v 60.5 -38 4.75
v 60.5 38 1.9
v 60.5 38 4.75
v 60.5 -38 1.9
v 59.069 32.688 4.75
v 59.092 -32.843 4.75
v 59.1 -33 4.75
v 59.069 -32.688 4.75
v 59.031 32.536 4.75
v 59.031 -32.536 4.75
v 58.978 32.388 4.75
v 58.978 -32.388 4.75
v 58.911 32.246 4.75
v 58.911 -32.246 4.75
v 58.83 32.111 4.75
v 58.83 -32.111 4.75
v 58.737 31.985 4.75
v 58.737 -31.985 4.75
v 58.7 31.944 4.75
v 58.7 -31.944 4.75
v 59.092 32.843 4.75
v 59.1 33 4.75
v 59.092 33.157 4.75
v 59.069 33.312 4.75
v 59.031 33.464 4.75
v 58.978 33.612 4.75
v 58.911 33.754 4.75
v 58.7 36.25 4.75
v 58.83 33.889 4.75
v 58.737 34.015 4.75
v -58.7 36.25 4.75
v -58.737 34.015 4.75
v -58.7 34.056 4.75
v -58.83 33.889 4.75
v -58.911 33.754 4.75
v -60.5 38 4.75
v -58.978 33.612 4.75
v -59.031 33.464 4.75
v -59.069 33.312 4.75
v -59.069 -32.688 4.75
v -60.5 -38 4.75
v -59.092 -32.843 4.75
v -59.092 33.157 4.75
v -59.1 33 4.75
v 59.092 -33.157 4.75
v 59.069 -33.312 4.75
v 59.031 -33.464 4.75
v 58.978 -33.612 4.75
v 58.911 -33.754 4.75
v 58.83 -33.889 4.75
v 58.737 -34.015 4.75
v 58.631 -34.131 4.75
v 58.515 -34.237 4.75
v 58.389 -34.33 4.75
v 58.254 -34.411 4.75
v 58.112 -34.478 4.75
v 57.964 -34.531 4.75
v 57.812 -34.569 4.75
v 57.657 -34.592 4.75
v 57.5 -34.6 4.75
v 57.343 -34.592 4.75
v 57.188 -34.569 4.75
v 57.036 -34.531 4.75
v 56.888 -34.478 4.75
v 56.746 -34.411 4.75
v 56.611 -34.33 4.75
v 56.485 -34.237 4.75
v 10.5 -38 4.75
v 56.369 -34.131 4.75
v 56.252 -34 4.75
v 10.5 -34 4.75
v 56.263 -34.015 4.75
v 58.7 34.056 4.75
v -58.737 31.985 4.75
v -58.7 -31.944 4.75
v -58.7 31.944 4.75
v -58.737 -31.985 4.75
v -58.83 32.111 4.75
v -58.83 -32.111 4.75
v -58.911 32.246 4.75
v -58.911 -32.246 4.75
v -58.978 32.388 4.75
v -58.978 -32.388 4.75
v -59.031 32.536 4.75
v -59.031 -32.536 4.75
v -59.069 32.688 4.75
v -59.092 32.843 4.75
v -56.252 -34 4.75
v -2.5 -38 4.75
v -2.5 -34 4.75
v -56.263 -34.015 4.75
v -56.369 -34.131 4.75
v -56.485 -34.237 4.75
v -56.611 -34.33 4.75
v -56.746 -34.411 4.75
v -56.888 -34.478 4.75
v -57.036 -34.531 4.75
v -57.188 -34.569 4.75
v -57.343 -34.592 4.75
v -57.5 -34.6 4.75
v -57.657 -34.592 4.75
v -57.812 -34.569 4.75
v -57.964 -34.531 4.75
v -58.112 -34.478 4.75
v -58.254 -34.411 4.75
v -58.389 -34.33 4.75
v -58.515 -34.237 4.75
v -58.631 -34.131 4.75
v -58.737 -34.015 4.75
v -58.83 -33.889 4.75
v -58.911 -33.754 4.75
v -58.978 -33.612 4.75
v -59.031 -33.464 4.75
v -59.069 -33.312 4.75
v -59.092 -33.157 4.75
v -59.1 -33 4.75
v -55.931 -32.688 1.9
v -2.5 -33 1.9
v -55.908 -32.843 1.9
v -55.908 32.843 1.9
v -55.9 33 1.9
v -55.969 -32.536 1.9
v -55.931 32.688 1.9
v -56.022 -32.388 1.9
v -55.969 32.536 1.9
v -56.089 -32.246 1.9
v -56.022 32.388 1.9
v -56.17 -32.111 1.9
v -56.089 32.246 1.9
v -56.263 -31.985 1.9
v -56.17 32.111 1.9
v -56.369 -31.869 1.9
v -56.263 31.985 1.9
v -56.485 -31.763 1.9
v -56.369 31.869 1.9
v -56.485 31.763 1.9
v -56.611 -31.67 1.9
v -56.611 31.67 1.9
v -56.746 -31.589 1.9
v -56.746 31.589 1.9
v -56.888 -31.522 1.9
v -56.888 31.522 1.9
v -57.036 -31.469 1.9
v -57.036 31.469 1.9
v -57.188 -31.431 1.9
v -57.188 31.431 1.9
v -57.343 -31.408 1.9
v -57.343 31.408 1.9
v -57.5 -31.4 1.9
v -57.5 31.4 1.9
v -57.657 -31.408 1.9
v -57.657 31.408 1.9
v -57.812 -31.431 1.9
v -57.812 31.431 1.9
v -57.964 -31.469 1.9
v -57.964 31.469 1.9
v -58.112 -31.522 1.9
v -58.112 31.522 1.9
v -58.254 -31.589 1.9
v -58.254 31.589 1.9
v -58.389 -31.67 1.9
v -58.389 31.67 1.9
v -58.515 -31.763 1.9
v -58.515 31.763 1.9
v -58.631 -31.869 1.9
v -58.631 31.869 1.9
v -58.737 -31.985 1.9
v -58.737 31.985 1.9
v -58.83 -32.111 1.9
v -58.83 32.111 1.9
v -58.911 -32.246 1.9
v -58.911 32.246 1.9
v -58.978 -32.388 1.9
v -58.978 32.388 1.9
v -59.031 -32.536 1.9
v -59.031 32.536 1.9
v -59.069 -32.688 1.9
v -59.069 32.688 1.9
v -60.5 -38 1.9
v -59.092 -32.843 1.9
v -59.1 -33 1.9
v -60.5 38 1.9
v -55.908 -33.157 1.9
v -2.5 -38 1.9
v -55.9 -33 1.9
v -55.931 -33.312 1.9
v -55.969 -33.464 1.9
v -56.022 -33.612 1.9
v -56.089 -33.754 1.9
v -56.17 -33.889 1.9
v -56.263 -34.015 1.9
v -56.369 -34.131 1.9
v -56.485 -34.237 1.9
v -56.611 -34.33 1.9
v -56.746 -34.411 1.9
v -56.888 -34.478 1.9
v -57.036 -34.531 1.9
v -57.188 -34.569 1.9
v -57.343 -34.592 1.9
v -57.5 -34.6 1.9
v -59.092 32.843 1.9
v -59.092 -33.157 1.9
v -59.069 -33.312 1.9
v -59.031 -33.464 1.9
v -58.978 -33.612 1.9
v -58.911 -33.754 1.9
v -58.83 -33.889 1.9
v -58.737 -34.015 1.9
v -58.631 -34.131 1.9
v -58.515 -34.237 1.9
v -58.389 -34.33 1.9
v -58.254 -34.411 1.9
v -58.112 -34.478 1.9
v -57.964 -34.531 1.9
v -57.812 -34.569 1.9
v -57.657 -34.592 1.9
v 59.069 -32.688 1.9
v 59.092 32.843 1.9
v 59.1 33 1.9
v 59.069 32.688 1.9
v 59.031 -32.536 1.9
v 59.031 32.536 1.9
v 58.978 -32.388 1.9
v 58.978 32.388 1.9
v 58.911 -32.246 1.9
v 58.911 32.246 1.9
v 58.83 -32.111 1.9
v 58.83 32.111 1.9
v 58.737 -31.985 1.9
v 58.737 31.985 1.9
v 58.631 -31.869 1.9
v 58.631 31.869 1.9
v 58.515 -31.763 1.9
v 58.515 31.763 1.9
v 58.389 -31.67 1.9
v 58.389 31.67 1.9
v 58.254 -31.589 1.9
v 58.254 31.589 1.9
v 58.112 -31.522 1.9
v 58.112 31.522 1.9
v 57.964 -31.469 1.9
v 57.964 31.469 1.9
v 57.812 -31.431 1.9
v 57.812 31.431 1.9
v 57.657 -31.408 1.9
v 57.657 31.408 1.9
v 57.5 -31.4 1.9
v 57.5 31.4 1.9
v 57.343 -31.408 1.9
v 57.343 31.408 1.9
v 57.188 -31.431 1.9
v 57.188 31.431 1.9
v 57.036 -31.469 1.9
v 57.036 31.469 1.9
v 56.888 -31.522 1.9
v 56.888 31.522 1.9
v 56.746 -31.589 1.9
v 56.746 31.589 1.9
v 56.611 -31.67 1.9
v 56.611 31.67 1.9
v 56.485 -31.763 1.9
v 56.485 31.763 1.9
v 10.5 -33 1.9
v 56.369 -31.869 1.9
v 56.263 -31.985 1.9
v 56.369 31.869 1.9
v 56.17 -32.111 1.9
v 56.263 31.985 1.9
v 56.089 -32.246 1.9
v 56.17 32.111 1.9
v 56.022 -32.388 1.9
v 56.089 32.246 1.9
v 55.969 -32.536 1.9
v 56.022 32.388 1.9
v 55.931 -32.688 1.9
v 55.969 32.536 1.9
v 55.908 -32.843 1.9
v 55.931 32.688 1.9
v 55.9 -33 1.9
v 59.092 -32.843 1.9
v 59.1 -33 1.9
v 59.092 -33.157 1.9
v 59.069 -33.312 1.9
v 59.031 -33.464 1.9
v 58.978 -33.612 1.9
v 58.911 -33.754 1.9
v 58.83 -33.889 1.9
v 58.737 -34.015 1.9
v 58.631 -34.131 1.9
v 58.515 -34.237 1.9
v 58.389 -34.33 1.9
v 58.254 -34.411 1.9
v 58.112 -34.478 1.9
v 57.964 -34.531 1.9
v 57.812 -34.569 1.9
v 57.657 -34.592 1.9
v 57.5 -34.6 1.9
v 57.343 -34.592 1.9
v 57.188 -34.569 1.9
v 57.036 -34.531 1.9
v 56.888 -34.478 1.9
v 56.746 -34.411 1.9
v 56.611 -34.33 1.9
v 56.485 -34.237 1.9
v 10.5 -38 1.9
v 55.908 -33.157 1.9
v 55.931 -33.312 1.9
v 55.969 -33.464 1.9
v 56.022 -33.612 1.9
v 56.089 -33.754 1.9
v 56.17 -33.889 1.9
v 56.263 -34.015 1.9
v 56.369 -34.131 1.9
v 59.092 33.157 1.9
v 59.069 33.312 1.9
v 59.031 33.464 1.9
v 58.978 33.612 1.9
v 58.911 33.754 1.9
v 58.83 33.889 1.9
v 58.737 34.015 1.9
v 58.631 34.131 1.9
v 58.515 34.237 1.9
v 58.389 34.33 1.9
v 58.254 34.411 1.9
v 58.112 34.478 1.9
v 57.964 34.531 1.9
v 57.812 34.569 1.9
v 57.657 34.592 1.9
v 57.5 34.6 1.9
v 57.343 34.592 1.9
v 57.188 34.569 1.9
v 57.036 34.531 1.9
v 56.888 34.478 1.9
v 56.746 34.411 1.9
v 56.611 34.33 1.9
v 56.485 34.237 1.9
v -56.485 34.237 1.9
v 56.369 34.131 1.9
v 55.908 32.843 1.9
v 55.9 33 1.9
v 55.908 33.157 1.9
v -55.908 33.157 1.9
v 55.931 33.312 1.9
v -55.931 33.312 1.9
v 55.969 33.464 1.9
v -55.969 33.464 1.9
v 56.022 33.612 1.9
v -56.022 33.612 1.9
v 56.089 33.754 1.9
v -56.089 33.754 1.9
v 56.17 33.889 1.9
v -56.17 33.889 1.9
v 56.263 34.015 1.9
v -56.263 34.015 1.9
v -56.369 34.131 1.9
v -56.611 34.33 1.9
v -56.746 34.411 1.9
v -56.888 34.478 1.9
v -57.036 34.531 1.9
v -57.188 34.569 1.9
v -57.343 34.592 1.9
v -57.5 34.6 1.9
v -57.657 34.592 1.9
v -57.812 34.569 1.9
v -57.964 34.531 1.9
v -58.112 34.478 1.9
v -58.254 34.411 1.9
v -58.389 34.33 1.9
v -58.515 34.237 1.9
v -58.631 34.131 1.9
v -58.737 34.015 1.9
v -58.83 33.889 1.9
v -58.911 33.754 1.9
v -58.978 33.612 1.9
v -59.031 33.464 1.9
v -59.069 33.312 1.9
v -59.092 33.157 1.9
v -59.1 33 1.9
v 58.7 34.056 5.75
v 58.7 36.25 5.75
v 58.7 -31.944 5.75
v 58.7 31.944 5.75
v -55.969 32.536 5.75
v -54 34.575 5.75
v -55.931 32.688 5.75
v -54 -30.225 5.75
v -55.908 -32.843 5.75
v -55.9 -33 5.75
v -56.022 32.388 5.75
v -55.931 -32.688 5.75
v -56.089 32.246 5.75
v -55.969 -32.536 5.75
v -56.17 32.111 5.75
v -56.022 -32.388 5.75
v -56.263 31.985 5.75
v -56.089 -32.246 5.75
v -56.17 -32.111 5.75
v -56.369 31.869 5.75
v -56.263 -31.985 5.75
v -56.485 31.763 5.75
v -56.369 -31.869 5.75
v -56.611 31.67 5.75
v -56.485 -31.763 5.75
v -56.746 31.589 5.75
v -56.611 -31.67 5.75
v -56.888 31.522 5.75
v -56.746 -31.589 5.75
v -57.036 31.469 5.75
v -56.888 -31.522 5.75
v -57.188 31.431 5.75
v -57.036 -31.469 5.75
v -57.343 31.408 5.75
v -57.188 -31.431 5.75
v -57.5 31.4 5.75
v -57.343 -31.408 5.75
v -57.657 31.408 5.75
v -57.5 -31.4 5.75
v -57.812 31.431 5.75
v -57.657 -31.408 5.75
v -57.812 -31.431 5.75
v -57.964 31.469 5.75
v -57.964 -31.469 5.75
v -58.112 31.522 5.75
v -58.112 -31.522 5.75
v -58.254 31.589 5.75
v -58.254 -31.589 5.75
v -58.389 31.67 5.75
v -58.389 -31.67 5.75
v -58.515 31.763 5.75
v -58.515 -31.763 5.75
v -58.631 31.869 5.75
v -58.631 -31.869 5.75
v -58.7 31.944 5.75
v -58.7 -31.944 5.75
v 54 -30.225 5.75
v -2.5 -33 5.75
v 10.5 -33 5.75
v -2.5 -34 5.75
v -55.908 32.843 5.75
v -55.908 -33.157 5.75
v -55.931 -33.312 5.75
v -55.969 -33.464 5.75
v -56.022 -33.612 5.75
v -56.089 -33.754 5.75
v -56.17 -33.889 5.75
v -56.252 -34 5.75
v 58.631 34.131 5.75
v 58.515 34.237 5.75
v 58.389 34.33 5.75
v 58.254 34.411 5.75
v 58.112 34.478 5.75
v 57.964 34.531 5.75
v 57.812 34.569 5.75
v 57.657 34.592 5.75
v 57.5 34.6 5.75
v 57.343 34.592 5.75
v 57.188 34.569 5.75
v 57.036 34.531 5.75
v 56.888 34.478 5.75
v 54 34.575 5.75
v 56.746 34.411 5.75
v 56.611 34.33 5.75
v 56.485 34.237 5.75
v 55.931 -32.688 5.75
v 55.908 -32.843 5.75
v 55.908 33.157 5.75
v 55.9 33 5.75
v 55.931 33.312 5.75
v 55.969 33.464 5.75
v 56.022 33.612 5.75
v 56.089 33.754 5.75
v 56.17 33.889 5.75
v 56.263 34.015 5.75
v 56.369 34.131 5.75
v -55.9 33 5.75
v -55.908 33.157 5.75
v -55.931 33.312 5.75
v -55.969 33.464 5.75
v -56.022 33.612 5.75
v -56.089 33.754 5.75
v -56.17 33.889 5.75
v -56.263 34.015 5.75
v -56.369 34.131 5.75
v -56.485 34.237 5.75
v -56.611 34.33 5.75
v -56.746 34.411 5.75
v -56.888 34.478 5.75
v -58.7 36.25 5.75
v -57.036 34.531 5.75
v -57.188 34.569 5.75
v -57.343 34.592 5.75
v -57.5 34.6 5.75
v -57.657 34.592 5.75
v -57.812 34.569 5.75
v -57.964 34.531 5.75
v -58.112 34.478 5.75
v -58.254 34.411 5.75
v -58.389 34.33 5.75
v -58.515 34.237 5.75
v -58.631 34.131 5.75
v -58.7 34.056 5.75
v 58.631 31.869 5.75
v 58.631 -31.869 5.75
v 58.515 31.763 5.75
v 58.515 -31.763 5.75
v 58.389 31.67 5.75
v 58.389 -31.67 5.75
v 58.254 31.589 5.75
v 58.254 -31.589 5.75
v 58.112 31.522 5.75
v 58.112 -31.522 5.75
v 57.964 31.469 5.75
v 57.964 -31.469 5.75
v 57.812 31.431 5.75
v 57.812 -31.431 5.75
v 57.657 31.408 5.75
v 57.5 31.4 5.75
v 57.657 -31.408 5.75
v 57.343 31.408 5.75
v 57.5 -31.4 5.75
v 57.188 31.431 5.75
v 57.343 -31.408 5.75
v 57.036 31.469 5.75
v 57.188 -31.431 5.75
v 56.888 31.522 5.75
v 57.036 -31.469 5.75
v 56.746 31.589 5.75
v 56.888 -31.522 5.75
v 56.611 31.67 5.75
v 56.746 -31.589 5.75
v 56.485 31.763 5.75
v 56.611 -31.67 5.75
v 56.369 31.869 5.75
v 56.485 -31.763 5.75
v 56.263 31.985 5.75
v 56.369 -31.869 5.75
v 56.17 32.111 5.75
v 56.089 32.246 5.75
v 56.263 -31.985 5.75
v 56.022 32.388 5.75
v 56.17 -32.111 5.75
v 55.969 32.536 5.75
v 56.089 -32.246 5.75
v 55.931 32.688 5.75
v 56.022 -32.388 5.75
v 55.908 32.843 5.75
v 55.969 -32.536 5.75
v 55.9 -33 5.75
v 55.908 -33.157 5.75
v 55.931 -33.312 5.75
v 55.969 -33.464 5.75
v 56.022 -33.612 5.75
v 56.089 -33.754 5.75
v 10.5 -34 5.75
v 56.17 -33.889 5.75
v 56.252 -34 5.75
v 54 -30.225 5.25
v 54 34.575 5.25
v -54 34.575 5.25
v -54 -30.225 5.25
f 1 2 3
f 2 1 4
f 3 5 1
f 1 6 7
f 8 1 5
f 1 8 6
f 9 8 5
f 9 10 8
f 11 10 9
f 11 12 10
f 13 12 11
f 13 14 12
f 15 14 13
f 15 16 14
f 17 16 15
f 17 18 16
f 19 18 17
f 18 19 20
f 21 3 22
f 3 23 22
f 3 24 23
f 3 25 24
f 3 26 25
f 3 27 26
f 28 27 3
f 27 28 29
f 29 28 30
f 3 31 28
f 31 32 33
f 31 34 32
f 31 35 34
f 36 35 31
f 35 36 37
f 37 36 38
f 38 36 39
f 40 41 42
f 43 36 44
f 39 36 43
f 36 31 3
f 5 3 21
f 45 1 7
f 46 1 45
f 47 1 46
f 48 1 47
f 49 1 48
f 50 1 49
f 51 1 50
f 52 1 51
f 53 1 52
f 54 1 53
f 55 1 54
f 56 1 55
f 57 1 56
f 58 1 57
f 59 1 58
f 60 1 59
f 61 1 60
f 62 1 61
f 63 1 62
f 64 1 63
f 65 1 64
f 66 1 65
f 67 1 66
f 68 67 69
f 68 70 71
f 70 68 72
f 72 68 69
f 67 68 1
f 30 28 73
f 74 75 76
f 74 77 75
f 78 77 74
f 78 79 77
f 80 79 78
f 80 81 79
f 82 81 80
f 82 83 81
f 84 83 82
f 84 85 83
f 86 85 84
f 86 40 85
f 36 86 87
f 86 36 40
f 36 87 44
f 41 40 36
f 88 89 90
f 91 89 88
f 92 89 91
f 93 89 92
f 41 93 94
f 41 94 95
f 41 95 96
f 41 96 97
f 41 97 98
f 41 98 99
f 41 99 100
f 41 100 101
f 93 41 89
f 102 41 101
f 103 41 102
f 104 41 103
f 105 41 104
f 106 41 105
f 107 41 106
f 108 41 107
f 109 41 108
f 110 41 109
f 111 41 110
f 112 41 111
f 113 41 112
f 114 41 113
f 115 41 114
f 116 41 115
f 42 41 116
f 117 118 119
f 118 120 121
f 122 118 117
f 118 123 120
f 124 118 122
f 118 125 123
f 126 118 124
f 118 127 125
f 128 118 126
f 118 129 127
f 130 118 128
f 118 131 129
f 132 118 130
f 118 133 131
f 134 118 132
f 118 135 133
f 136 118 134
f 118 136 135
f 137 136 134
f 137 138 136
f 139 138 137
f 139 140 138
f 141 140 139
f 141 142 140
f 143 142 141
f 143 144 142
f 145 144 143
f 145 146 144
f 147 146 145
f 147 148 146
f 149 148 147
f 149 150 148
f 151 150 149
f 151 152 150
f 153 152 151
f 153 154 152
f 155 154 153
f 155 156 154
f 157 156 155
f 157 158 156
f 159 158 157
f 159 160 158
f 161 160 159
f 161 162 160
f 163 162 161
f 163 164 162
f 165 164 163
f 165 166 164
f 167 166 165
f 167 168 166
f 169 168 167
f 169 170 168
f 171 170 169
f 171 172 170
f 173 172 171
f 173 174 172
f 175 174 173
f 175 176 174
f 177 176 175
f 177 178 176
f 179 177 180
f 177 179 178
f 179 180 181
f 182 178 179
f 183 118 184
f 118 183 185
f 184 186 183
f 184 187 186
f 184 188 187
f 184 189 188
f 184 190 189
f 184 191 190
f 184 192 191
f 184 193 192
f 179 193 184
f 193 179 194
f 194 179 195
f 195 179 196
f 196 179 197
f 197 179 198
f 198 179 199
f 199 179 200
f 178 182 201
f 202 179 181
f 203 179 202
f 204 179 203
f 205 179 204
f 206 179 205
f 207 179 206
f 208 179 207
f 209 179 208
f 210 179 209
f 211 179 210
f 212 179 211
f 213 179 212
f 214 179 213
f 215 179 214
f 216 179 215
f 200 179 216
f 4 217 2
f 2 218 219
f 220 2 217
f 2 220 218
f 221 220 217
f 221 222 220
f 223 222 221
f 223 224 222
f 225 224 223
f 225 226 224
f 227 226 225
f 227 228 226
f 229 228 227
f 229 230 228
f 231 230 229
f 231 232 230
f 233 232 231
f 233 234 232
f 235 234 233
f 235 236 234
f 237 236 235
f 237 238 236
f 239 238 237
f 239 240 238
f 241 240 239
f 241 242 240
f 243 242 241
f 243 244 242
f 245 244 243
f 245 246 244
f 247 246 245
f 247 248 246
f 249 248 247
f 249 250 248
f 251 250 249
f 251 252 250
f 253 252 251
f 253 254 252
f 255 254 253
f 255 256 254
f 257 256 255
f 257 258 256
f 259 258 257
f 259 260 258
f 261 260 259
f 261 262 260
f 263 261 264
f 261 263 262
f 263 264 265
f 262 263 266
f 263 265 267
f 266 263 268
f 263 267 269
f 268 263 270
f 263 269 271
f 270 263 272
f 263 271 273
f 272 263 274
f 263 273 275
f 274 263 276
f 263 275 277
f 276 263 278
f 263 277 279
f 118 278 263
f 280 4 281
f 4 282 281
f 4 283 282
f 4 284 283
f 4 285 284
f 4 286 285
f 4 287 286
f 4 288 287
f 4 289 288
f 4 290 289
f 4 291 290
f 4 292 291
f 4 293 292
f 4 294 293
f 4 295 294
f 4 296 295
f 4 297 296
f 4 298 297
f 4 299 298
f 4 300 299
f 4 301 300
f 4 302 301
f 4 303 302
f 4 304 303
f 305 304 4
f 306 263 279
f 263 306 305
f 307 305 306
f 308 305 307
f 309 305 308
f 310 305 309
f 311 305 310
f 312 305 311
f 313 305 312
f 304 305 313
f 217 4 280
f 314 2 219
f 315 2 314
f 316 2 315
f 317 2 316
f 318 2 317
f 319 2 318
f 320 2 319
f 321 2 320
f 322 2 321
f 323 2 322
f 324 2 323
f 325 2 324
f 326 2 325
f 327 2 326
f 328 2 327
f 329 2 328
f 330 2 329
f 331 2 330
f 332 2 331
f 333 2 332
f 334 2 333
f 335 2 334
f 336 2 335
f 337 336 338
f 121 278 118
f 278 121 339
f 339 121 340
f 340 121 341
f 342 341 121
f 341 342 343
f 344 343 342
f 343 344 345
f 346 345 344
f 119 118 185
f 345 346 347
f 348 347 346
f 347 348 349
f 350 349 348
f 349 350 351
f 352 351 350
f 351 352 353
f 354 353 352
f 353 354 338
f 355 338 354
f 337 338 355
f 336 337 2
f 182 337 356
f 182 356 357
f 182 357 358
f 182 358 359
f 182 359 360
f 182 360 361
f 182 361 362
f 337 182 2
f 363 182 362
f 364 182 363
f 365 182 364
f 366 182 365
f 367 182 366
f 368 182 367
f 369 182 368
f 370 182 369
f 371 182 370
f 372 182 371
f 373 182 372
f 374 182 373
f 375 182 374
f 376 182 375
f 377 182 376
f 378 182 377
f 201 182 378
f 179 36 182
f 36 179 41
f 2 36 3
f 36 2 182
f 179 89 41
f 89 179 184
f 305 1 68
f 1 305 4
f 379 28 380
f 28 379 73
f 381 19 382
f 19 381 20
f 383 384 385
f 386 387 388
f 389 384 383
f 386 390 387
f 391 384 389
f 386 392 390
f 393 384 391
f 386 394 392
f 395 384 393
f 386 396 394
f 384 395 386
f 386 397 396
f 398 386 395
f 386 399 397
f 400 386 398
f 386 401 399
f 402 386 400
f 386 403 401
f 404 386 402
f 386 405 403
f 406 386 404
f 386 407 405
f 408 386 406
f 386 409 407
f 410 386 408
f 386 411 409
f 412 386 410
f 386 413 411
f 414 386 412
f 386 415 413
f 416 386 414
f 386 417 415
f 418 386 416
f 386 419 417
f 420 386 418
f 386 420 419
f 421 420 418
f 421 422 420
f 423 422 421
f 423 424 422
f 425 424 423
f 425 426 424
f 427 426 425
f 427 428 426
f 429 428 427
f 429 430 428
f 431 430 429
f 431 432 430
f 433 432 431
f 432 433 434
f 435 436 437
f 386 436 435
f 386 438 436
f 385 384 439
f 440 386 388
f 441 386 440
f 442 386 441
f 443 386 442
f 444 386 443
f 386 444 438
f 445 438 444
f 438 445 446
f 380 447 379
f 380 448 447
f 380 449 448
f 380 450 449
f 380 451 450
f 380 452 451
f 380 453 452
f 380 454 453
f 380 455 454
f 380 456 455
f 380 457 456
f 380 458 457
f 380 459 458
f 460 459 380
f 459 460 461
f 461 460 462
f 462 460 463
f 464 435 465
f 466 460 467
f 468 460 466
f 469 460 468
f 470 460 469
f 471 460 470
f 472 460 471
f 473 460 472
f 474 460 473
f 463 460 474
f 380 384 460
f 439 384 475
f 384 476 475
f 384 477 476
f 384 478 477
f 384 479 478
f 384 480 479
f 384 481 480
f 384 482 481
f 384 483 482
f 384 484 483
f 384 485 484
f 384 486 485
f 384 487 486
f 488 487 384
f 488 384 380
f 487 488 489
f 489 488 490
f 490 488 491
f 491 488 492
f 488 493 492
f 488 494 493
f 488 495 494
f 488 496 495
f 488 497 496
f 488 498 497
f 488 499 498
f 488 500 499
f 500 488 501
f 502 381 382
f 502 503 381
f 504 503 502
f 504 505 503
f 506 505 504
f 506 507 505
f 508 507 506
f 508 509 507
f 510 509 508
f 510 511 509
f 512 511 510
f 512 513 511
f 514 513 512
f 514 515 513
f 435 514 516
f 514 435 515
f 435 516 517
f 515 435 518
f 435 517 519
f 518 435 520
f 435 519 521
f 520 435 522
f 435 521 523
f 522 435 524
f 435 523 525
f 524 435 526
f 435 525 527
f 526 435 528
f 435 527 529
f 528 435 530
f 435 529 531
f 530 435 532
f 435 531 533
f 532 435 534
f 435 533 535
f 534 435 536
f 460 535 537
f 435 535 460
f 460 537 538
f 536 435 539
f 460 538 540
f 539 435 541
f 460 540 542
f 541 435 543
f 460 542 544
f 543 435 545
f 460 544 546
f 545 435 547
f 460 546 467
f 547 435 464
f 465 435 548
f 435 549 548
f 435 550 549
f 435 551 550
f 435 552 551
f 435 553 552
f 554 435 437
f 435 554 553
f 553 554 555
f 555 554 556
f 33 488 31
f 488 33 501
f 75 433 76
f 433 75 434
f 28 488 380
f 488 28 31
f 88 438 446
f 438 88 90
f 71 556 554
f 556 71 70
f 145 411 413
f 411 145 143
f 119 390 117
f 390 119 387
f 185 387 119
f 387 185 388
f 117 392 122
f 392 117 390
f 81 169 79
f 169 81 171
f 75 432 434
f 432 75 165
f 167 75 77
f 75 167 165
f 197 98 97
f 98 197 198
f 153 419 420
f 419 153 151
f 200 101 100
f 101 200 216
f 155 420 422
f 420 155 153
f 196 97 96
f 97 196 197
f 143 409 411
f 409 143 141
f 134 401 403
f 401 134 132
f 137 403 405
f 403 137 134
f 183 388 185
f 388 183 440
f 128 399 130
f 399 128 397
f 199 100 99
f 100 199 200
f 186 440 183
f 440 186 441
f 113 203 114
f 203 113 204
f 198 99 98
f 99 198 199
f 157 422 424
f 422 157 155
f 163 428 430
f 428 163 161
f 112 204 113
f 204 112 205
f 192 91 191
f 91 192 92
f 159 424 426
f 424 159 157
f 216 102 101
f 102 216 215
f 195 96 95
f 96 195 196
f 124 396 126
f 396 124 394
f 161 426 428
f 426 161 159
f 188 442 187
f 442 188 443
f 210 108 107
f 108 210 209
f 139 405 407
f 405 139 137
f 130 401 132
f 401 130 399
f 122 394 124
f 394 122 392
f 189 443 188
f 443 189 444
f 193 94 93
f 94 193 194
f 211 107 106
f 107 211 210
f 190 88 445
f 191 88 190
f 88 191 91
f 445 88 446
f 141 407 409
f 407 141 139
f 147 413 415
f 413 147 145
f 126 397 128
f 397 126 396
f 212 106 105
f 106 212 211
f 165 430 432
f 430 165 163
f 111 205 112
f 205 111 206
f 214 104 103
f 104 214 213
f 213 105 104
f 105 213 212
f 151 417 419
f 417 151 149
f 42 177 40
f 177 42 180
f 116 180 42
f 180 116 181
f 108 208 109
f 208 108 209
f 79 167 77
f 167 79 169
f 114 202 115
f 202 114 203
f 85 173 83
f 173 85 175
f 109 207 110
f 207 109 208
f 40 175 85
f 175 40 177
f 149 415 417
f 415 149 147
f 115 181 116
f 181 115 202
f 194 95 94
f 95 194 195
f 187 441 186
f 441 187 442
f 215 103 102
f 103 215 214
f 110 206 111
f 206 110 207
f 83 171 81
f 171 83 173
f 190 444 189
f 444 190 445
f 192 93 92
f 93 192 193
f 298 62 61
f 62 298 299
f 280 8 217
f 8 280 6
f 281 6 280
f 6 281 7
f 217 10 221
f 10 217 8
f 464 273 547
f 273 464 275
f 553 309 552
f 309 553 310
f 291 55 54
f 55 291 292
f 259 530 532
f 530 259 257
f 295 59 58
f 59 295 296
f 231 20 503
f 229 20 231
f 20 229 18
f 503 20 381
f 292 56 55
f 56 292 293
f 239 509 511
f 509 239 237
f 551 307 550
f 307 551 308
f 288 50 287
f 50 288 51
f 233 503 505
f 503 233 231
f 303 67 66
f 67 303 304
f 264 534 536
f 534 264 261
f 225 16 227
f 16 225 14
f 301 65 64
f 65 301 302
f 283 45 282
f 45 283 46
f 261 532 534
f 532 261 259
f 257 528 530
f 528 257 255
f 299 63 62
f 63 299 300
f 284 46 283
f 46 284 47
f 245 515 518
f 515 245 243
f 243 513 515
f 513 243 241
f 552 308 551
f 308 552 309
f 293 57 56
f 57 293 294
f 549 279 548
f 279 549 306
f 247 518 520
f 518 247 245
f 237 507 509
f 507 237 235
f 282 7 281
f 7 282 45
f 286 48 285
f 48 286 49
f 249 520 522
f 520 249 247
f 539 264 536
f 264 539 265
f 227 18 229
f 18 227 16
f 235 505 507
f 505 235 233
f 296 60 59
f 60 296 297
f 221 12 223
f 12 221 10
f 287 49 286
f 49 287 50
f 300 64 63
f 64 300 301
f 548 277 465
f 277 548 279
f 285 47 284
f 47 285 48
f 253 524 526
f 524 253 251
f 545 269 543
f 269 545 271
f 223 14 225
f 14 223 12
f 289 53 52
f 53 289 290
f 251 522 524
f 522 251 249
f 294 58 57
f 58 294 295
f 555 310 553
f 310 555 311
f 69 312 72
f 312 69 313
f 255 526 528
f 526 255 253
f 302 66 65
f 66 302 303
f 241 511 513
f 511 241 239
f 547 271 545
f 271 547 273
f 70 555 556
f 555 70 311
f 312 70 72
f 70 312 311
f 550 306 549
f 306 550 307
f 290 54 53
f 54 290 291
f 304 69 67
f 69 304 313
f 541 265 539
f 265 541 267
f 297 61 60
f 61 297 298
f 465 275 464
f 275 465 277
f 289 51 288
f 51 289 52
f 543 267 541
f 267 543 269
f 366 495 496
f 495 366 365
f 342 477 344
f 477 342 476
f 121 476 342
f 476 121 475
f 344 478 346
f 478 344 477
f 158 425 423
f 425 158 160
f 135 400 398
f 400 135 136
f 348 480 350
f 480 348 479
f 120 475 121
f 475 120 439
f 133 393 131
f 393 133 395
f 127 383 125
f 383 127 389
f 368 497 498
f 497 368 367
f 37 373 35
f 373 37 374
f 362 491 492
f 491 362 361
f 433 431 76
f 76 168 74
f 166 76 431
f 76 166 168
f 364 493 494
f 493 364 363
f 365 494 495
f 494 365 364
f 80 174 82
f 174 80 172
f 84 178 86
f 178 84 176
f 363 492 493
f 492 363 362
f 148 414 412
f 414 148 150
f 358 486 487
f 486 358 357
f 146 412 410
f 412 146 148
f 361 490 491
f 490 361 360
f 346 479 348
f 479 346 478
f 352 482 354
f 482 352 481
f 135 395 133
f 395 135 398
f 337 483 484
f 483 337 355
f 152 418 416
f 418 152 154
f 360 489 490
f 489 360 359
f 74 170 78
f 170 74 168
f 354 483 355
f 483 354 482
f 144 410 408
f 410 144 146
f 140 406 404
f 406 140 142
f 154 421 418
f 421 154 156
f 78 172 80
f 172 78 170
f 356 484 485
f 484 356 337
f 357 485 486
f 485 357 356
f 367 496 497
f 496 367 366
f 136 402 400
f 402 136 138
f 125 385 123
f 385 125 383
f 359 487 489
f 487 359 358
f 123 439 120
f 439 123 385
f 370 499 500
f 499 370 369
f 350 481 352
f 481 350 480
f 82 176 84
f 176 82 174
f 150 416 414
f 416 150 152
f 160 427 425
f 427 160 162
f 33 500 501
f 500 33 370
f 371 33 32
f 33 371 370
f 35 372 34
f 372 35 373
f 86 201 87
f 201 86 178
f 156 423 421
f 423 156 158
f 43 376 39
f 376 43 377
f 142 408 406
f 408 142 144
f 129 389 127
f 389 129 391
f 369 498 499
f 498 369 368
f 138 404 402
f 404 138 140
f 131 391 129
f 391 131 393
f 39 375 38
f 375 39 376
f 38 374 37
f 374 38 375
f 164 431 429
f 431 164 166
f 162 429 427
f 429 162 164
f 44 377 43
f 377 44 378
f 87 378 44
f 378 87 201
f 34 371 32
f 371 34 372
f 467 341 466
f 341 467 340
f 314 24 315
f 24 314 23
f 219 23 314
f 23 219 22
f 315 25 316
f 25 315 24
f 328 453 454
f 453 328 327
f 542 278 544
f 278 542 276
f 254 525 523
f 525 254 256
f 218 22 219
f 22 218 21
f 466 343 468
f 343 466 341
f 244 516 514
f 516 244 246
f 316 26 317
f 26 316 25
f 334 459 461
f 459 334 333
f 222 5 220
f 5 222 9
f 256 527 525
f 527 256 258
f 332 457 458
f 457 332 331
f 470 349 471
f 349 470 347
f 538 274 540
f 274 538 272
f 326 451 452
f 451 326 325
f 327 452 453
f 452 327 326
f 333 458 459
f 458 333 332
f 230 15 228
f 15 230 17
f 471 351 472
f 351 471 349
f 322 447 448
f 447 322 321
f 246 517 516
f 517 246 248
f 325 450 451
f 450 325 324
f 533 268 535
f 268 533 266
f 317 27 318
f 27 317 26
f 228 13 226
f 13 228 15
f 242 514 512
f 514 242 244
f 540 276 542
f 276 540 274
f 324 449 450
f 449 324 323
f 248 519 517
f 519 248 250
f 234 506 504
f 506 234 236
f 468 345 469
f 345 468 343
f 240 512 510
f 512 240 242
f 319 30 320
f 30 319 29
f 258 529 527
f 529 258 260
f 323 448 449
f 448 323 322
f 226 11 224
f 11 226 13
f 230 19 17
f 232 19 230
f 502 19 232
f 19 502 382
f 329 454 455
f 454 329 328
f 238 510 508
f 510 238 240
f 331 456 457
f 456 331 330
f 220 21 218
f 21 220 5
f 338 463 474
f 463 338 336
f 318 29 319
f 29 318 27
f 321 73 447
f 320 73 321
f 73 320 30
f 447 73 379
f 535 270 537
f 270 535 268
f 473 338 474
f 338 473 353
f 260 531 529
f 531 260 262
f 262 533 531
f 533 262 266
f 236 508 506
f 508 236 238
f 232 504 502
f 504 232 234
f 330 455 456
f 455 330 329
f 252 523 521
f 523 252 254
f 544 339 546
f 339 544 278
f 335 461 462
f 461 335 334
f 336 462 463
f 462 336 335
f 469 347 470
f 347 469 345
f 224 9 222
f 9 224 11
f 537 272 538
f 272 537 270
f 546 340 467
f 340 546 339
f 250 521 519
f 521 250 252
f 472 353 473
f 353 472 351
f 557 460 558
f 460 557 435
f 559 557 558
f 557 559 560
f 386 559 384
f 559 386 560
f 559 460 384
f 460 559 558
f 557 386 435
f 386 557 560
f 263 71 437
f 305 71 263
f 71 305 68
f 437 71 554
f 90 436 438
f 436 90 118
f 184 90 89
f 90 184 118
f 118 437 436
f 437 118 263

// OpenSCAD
$fn=64;

// HDMI display 5"
// Overall PCB: 121 x 76 x 2.85
pcb_size = [121, 76, 2.85];

// PCB offset (relative placement reference)
pcb_offset = [0, 0, 1.9];

// Aperture (window cutout): corners given as [[x1,y1],[x2,y2,zdepth]]
aperture_min = [-54, -30.225];
aperture_max = [ 54,  34.575];
aperture_depth = 0.5;

// Touch screen (outer active area / cover): [[x1,y1],[x2,y2,zdepth]]
ts_min = [-58.7, -34];
ts_max = [ 58.7,  36.25];
ts_depth = 1;

// Thread length (standoff/holes depth hint)
thread_length = 2;

// Clearance needed for TS ribbon: rectangle [[x1,y1],[x2,y2]]
ribbon_min = [-2.5, -39];
ribbon_max = [10.5, -33];
ribbon_clear_z = 10; // arbitrary tall cut

// Derived sizes
aperture_size = [aperture_max[0]-aperture_min[0], aperture_max[1]-aperture_min[1], aperture_depth];
ts_size       = [ts_max[0]-ts_min[0],           ts_max[1]-ts_min[1],           ts_depth];
ribbon_size   = [ribbon_max[0]-ribbon_min[0],   ribbon_max[1]-ribbon_min[1],   ribbon_clear_z];

// Simple mounting hole pattern (typical for 5" HDMI boards; adjustable)
hole_d = 3.2;
hole_positions = [
    [-57.5, -33.0],
    [ 57.5, -33.0],
    [-57.5,  33.0],
    [ 57.5,  33.0]
];

module pcb_body() {
    translate(pcb_offset)
        color([0.05,0.35,0.12])
            translate([-pcb_size[0]/2, -pcb_size[1]/2, 0])
                cube(pcb_size, center=false);
}

module touchscreen_plate() {
    // Place on top of PCB
    translate([0,0, pcb_offset[2] + pcb_size[2]])
        color([0.1,0.1,0.1, 0.85])
            translate([ts_min[0], ts_min[1], 0])
                cube(ts_size, center=false);
}

module aperture_cut() {
    // Cut down into touchscreen/pcb stack
    translate([0,0, pcb_offset[2] + pcb_size[2] + ts_depth - aperture_depth])
        translate([aperture_min[0], aperture_min[1], 0])
            cube(aperture_size, center=false);
}

module ribbon_clearance_cut() {
    // Cut a clearance slot below the PCB edge region
    translate([0,0, pcb_offset[2] - 0.1])
        translate([ribbon_min[0], ribbon_min[1], 0])
            cube(ribbon_size, center=false);
}

module mounting_holes_cut() {
    // Drill through PCB + touchscreen
    h = pcb_size[2] + ts_depth + 2;
    z0 = pcb_offset[2] - 1;
    for (p = hole_positions)
        translate([p[0], p[1], z0])
            cylinder(d=hole_d, h=h, center=false);
}

difference() {
    union() {
        pcb_body();
        touchscreen_plate();
    }
    aperture_cut();
    ribbon_clearance_cut();
    mounting_holes_cut();
}
